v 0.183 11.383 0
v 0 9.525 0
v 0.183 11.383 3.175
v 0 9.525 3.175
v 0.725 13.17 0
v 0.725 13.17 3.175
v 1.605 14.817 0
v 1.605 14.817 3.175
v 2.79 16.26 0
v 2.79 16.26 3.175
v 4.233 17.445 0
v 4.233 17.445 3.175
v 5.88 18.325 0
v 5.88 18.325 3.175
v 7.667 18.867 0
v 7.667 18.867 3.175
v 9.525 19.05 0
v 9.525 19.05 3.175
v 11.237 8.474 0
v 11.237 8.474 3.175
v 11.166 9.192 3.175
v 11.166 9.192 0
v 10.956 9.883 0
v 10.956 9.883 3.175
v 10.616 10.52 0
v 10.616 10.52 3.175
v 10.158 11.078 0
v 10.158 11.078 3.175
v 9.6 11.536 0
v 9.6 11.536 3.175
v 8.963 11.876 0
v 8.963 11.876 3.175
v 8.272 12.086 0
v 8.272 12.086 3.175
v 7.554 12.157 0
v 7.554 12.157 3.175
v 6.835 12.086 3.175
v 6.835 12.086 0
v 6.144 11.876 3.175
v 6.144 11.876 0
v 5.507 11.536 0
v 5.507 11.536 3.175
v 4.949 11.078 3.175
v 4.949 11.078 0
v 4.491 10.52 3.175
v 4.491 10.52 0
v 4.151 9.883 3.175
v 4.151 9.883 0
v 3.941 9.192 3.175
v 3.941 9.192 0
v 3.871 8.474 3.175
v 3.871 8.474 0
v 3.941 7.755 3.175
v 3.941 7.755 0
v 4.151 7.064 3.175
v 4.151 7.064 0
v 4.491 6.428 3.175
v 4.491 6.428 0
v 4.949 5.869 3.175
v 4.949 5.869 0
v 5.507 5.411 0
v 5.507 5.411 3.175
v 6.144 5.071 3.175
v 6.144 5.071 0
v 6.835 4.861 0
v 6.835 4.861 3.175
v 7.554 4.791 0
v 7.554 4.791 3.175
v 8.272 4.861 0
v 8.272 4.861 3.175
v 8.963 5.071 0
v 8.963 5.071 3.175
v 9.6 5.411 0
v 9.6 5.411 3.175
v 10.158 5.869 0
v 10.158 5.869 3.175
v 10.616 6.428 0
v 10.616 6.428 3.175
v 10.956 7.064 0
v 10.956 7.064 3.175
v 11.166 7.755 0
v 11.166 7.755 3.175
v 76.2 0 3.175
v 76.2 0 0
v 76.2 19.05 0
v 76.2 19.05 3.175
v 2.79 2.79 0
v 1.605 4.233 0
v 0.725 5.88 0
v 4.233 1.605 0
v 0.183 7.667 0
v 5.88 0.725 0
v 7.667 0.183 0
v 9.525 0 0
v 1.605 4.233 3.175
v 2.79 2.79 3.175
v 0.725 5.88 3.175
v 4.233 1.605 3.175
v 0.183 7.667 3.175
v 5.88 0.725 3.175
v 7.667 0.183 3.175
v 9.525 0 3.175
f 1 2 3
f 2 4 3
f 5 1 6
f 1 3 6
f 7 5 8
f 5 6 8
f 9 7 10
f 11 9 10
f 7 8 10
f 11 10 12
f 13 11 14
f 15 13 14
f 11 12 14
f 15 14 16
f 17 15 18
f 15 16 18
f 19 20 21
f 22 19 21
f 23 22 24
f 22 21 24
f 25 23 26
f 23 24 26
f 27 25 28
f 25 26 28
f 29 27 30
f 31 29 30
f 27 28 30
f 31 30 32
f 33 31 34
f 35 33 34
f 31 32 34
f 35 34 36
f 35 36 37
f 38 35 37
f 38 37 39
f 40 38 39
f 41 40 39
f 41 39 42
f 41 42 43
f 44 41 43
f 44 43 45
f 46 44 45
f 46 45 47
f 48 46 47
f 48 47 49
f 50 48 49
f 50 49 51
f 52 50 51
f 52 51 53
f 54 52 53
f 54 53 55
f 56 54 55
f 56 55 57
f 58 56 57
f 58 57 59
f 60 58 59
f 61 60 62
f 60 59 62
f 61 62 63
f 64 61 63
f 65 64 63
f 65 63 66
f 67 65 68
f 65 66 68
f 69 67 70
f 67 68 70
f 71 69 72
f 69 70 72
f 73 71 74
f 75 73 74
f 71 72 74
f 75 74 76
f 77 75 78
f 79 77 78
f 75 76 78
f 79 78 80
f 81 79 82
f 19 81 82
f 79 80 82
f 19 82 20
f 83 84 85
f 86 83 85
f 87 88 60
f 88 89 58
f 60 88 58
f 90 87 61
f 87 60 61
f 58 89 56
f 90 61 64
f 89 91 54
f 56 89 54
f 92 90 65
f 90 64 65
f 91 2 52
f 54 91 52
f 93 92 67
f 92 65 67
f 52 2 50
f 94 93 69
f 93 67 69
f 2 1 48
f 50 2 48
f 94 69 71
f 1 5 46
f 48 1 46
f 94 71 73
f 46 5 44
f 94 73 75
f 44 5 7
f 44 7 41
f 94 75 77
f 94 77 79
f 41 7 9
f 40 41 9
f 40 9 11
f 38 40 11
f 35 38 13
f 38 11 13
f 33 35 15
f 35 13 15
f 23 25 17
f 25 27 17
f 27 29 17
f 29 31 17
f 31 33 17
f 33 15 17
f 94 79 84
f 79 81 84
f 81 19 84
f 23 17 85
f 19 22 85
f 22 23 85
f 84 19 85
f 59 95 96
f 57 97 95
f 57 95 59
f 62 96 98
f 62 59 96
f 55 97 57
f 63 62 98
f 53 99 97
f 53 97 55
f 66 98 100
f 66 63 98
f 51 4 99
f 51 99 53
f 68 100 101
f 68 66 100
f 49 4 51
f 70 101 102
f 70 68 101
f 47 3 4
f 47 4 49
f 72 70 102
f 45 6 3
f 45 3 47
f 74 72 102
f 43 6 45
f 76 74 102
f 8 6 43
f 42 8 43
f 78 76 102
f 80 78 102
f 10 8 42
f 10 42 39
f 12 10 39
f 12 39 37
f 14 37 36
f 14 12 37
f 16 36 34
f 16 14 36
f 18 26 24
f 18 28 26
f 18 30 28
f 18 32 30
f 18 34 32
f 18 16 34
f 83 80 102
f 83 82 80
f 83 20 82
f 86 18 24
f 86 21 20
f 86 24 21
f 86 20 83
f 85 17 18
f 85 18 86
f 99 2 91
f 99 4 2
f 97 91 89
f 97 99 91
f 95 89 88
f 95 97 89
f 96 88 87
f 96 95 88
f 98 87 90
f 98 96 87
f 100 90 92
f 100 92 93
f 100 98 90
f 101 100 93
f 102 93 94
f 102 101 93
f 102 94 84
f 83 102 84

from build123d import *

# Parameters (mm, degrees)
SKETCH1_W           = 76.2
SKETCH1_H           = 19.05
BOSS_EXTRUDE1_DEPTH = 3.175
FILLET1_R           = 9.525
SKETCH2_R           = 3.683
CUT_EXTRUDE1_DEPTH  = 79.60930686


with BuildPart() as part:
    # Sketch1 → Boss-Extrude1 (new body)
    with BuildSketch(Plane.XY):
        with Locations((38.1, 9.525)):
            Rectangle(SKETCH1_W, SKETCH1_H)
    extrude(amount=BOSS_EXTRUDE1_DEPTH)

    # Fillet1
    fillet1_edges = [part.edges().sort_by_distance(p)[0] for p in [
        (0, 0, 1.5875),
        (0, 19.05, 1.5875),
    ]]
    fillet(fillet1_edges, radius=FILLET1_R - 0.0001)  # a hair under: the kernel refuses the full size

    # Sketch2 → Cut-Extrude1 (cut, through all)
    with BuildSketch(Plane.XY.offset(3.175)):
        with Locations((7.553506199, 8.47367626)):
            Circle(SKETCH2_R)
    extrude(amount=-CUT_EXTRUDE1_DEPTH, mode=Mode.SUBTRACT)


solid = part.part
